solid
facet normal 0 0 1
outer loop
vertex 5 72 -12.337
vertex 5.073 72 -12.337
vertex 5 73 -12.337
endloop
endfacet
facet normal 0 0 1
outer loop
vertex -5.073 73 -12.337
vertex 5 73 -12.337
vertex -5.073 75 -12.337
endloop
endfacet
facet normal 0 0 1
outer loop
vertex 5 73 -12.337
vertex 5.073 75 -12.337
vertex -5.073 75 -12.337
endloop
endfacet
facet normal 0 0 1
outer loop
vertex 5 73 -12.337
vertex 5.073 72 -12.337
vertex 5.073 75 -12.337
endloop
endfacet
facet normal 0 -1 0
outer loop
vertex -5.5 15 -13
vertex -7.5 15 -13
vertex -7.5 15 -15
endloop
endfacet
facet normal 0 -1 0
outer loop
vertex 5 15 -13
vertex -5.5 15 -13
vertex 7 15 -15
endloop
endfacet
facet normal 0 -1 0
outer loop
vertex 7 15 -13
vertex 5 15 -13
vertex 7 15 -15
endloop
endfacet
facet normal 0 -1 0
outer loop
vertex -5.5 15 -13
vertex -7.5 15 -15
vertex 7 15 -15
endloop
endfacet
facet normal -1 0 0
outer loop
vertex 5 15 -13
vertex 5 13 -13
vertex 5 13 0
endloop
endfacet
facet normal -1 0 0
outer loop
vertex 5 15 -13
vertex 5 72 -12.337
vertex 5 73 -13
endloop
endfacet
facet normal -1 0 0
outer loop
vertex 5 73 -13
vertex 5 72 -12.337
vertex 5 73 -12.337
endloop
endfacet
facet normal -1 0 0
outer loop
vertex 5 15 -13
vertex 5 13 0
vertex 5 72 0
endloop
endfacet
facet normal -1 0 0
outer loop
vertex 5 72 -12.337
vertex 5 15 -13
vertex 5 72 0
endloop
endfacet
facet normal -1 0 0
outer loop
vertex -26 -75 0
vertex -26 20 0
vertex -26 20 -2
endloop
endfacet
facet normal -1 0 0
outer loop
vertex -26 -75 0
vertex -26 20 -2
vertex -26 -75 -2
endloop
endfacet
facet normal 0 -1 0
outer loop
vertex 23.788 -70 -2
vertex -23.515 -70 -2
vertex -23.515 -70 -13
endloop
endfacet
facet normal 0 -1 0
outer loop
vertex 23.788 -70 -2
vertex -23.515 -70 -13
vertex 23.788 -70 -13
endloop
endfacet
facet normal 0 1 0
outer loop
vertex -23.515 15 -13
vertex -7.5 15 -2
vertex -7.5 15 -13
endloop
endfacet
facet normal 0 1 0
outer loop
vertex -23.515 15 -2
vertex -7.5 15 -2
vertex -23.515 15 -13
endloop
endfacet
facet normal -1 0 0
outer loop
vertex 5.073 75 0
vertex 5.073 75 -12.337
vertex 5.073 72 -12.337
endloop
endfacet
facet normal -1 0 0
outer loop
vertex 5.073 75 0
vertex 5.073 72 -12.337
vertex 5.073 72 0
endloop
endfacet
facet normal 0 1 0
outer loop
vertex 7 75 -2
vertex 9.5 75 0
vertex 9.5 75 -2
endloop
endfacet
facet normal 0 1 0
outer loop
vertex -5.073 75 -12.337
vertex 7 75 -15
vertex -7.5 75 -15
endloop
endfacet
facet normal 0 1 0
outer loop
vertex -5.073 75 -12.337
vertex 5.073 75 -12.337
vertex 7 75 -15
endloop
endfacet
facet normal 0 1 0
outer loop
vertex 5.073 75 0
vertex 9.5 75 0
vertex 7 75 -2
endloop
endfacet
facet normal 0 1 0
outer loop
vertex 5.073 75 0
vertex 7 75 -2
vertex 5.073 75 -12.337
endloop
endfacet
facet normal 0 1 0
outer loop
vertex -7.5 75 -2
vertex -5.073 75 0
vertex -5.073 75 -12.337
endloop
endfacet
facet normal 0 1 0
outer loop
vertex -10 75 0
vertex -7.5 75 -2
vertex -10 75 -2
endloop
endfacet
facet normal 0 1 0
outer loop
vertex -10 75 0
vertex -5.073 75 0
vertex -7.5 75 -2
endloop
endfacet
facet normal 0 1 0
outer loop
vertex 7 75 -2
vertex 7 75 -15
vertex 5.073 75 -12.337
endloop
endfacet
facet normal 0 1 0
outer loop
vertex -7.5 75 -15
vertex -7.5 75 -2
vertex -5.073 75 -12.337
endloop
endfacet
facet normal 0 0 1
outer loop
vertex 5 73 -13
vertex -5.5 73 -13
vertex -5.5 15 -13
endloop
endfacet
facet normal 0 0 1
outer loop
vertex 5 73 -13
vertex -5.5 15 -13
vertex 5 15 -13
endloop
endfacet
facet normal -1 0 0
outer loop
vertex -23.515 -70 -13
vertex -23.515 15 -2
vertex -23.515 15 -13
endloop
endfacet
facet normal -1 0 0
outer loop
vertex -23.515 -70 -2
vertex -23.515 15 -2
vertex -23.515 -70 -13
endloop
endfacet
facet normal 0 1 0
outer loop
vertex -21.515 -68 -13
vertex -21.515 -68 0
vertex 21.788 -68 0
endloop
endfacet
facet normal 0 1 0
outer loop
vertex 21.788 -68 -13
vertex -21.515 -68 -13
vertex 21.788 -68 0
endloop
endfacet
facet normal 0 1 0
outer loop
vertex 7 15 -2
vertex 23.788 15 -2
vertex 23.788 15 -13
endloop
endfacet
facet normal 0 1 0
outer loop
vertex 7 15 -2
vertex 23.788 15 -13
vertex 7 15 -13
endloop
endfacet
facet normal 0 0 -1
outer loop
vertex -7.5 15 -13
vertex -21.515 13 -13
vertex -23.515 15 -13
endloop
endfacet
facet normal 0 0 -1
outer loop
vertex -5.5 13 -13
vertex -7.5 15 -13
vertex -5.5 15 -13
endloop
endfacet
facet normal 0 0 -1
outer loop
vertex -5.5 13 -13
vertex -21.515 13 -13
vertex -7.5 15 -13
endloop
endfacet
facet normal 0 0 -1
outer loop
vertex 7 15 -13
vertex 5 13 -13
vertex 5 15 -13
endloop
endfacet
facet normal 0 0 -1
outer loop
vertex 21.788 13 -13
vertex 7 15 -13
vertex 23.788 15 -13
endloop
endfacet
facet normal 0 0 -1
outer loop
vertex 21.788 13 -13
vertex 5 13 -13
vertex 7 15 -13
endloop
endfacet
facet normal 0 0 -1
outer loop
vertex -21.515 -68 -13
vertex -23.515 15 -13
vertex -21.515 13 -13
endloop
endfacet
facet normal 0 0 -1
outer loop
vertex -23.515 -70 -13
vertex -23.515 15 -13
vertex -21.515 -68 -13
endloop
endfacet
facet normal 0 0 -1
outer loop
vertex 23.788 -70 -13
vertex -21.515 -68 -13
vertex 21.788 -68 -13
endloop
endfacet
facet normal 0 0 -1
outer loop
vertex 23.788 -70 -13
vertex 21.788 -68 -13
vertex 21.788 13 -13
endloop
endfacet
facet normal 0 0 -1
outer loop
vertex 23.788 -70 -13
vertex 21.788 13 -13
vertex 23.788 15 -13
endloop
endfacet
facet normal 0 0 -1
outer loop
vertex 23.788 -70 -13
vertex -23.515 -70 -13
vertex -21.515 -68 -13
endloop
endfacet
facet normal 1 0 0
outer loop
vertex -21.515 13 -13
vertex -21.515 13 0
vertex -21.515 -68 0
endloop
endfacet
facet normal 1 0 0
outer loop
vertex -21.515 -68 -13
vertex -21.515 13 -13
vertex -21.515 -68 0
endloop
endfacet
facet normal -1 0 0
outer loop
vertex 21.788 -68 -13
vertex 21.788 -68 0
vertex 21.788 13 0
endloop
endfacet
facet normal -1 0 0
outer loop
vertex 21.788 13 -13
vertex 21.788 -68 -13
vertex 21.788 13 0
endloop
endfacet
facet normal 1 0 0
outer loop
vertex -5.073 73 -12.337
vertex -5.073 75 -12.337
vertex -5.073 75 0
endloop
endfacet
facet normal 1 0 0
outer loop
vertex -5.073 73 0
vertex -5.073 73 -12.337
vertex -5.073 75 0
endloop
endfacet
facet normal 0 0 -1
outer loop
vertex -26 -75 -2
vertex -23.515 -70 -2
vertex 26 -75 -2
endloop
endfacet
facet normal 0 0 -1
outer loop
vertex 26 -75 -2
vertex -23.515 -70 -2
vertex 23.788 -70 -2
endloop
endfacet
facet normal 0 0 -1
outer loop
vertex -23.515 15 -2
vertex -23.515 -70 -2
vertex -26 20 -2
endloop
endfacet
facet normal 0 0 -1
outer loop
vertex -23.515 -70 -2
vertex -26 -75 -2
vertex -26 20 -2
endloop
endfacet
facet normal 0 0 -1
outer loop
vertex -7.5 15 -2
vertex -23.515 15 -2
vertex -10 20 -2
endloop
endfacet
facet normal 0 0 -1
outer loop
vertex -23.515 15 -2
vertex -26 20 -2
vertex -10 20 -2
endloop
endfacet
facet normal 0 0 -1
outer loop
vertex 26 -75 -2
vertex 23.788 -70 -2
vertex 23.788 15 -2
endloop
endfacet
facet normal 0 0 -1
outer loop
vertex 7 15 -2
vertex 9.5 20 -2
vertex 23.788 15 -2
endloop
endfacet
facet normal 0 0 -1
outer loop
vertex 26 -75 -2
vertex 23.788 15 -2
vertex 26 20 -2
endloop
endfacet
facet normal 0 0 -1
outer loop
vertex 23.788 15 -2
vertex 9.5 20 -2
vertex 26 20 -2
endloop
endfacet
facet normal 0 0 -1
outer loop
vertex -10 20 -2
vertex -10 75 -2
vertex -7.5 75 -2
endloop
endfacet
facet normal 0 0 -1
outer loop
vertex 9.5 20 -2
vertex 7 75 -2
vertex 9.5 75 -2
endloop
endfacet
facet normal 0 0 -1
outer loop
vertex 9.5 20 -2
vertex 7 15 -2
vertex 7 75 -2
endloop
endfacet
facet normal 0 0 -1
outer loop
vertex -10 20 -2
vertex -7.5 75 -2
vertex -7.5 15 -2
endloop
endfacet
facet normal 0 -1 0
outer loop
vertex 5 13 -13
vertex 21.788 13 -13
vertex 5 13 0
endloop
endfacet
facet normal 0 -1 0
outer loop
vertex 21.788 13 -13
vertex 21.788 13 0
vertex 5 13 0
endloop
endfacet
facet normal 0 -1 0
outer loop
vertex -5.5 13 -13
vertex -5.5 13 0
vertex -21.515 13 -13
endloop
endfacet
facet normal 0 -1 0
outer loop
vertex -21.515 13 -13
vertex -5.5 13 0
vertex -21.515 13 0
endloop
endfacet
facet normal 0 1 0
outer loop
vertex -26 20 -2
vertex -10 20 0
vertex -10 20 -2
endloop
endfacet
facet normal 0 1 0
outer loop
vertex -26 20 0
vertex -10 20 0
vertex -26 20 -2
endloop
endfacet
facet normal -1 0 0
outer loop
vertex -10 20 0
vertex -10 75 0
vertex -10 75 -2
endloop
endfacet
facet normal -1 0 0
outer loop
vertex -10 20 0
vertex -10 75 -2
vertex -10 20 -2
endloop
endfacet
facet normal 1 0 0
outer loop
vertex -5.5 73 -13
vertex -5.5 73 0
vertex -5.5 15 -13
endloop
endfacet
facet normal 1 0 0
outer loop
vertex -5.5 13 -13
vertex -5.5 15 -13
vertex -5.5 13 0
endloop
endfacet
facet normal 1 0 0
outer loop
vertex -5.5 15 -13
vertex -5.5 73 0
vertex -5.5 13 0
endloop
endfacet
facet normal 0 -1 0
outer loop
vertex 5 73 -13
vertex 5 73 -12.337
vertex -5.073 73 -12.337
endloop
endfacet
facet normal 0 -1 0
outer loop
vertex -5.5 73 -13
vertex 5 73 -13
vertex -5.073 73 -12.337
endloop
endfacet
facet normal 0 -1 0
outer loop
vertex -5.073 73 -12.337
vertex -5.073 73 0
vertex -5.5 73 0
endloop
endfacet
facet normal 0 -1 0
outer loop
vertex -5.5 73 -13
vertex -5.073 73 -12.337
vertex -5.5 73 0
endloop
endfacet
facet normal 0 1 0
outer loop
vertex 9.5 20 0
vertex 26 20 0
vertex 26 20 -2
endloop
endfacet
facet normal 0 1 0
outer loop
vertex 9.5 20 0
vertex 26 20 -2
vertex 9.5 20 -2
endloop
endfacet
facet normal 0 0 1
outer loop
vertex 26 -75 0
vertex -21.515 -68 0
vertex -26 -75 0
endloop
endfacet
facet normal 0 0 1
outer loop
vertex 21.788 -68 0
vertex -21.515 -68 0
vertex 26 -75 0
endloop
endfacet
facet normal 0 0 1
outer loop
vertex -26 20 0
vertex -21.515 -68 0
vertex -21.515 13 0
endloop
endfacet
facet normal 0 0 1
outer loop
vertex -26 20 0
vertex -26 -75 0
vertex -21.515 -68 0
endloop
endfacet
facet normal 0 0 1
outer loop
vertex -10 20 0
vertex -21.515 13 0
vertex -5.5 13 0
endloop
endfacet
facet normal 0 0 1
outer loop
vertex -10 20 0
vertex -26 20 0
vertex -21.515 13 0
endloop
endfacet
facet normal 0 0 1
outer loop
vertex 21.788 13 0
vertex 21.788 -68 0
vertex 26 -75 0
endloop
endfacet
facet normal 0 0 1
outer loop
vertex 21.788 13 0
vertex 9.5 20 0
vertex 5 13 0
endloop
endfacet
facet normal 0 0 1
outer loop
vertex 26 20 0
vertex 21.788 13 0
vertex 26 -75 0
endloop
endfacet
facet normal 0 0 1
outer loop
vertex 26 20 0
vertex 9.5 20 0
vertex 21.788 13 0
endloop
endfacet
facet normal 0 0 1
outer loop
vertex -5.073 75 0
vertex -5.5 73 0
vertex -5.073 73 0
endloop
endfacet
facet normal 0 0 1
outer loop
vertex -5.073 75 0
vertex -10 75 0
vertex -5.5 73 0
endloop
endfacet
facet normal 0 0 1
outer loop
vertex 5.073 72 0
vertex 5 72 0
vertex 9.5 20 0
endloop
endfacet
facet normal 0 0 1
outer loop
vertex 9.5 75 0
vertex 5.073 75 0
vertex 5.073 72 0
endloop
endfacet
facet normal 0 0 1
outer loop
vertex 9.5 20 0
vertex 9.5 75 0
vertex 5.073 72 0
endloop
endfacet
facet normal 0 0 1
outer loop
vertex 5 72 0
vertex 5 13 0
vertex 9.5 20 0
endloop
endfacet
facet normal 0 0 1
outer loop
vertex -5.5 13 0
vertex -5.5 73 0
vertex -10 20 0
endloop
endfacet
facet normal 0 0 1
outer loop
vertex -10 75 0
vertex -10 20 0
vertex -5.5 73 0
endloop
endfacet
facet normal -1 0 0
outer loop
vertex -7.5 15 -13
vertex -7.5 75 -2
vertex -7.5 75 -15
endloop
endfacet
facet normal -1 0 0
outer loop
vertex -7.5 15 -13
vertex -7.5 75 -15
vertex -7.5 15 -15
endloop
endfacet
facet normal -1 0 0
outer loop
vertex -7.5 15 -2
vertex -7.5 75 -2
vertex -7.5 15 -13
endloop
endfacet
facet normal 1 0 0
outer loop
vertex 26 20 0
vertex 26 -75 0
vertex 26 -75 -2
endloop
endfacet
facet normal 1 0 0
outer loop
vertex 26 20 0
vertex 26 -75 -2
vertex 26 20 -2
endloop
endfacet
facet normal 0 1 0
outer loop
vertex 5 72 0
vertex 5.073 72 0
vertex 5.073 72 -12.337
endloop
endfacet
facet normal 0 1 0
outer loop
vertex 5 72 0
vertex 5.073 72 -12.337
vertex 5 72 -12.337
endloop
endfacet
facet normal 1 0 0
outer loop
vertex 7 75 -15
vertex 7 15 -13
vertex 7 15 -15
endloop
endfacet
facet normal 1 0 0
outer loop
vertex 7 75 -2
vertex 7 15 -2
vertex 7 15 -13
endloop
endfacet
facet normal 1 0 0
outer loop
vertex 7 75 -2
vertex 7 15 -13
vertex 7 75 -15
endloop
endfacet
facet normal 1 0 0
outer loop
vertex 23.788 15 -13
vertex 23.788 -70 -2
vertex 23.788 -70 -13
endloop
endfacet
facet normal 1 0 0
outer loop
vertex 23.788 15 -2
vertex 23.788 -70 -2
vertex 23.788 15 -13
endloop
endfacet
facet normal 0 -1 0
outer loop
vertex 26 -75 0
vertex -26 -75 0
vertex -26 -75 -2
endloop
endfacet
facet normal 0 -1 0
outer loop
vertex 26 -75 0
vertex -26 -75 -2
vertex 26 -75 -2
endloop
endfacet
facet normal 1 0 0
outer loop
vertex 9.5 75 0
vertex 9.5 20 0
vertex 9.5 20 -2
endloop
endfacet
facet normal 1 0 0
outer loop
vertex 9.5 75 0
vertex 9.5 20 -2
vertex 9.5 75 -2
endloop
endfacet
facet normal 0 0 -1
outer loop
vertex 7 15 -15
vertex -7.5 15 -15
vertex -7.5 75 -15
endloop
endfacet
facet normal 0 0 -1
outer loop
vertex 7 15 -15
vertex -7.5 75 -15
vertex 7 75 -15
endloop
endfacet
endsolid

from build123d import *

# Parameters (mm, degrees)
F1_DEPTH = 15
F2_T     = -2
F3_DEPTH = 2
F5_DEPTH = 2
F6_W     = 10.1464129984
F6_H     = 12.3371165246
F7_DEPTH = 3


with BuildPart() as f1:
    # F0 (on Top) → F1 (new body)
    with BuildSketch(Plane.XY):
        Polygon((7.0000002384, 15), (7.0000002384, 75), (4.5000002384, 75), (-5, 75), (-7.5, 75), (-7.5, 15), (-23.5152803361, 15), (-23.5152803361, -70), (-21, -70), (21, -70), (23.7875375897, -70), (23.7875375897, 15), (21, 15), align=None)
    extrude(amount=-F1_DEPTH)

    # F2
    f2_openings = [f1.faces().sort_by_distance(p)[0] for p in [
        (0.067441, -14.603177, 0),
    ]]
    offset(amount=F2_T, openings=f2_openings, kind=Kind.INTERSECTION)

    # F0 (on Top) → F3 (join)
    with BuildSketch(Plane.XY):
        Polygon((-26, -75), (26, -75), (26, 20), (9.5000002384, 20), (9.5000002384, 75), (7.0000002384, 75), (7.0000002384, 15), (21, 15), (23.7875375897, 15), (23.7875375897, -70), (21, -70), (-21, -70), (-23.5152803361, -70), (-23.5152803361, 15), (-7.5, 15), (-7.5, 75), (-10, 75), (-10, 20), (-26, 20), align=None)
    extrude(amount=-F3_DEPTH)

    # F4 (on face) → F5 (cut)
    with BuildSketch(Plane(origin=(0, 0, -15), x_dir=(1, 0, 0), z_dir=(0, 0, -1))):
        Polygon((23.7875375897, 70), (-23.5152803361, 70), (-23.5152803361, -15), (-7.5, -15), (7.0000002384, -15), (23.7875375897, -15), align=None)
    extrude(amount=-F5_DEPTH, mode=Mode.SUBTRACT)

    # F6 (on face) → F7 (cut)
    with BuildSketch(Plane(origin=(0, 75, 0), x_dir=(-1, 0, 0), z_dir=(0, 1, 0))):
        with Locations((0, -6.1685582623)):
            Rectangle(F6_W, F6_H)
    extrude(amount=-F7_DEPTH, mode=Mode.SUBTRACT)


solid = f1.part
